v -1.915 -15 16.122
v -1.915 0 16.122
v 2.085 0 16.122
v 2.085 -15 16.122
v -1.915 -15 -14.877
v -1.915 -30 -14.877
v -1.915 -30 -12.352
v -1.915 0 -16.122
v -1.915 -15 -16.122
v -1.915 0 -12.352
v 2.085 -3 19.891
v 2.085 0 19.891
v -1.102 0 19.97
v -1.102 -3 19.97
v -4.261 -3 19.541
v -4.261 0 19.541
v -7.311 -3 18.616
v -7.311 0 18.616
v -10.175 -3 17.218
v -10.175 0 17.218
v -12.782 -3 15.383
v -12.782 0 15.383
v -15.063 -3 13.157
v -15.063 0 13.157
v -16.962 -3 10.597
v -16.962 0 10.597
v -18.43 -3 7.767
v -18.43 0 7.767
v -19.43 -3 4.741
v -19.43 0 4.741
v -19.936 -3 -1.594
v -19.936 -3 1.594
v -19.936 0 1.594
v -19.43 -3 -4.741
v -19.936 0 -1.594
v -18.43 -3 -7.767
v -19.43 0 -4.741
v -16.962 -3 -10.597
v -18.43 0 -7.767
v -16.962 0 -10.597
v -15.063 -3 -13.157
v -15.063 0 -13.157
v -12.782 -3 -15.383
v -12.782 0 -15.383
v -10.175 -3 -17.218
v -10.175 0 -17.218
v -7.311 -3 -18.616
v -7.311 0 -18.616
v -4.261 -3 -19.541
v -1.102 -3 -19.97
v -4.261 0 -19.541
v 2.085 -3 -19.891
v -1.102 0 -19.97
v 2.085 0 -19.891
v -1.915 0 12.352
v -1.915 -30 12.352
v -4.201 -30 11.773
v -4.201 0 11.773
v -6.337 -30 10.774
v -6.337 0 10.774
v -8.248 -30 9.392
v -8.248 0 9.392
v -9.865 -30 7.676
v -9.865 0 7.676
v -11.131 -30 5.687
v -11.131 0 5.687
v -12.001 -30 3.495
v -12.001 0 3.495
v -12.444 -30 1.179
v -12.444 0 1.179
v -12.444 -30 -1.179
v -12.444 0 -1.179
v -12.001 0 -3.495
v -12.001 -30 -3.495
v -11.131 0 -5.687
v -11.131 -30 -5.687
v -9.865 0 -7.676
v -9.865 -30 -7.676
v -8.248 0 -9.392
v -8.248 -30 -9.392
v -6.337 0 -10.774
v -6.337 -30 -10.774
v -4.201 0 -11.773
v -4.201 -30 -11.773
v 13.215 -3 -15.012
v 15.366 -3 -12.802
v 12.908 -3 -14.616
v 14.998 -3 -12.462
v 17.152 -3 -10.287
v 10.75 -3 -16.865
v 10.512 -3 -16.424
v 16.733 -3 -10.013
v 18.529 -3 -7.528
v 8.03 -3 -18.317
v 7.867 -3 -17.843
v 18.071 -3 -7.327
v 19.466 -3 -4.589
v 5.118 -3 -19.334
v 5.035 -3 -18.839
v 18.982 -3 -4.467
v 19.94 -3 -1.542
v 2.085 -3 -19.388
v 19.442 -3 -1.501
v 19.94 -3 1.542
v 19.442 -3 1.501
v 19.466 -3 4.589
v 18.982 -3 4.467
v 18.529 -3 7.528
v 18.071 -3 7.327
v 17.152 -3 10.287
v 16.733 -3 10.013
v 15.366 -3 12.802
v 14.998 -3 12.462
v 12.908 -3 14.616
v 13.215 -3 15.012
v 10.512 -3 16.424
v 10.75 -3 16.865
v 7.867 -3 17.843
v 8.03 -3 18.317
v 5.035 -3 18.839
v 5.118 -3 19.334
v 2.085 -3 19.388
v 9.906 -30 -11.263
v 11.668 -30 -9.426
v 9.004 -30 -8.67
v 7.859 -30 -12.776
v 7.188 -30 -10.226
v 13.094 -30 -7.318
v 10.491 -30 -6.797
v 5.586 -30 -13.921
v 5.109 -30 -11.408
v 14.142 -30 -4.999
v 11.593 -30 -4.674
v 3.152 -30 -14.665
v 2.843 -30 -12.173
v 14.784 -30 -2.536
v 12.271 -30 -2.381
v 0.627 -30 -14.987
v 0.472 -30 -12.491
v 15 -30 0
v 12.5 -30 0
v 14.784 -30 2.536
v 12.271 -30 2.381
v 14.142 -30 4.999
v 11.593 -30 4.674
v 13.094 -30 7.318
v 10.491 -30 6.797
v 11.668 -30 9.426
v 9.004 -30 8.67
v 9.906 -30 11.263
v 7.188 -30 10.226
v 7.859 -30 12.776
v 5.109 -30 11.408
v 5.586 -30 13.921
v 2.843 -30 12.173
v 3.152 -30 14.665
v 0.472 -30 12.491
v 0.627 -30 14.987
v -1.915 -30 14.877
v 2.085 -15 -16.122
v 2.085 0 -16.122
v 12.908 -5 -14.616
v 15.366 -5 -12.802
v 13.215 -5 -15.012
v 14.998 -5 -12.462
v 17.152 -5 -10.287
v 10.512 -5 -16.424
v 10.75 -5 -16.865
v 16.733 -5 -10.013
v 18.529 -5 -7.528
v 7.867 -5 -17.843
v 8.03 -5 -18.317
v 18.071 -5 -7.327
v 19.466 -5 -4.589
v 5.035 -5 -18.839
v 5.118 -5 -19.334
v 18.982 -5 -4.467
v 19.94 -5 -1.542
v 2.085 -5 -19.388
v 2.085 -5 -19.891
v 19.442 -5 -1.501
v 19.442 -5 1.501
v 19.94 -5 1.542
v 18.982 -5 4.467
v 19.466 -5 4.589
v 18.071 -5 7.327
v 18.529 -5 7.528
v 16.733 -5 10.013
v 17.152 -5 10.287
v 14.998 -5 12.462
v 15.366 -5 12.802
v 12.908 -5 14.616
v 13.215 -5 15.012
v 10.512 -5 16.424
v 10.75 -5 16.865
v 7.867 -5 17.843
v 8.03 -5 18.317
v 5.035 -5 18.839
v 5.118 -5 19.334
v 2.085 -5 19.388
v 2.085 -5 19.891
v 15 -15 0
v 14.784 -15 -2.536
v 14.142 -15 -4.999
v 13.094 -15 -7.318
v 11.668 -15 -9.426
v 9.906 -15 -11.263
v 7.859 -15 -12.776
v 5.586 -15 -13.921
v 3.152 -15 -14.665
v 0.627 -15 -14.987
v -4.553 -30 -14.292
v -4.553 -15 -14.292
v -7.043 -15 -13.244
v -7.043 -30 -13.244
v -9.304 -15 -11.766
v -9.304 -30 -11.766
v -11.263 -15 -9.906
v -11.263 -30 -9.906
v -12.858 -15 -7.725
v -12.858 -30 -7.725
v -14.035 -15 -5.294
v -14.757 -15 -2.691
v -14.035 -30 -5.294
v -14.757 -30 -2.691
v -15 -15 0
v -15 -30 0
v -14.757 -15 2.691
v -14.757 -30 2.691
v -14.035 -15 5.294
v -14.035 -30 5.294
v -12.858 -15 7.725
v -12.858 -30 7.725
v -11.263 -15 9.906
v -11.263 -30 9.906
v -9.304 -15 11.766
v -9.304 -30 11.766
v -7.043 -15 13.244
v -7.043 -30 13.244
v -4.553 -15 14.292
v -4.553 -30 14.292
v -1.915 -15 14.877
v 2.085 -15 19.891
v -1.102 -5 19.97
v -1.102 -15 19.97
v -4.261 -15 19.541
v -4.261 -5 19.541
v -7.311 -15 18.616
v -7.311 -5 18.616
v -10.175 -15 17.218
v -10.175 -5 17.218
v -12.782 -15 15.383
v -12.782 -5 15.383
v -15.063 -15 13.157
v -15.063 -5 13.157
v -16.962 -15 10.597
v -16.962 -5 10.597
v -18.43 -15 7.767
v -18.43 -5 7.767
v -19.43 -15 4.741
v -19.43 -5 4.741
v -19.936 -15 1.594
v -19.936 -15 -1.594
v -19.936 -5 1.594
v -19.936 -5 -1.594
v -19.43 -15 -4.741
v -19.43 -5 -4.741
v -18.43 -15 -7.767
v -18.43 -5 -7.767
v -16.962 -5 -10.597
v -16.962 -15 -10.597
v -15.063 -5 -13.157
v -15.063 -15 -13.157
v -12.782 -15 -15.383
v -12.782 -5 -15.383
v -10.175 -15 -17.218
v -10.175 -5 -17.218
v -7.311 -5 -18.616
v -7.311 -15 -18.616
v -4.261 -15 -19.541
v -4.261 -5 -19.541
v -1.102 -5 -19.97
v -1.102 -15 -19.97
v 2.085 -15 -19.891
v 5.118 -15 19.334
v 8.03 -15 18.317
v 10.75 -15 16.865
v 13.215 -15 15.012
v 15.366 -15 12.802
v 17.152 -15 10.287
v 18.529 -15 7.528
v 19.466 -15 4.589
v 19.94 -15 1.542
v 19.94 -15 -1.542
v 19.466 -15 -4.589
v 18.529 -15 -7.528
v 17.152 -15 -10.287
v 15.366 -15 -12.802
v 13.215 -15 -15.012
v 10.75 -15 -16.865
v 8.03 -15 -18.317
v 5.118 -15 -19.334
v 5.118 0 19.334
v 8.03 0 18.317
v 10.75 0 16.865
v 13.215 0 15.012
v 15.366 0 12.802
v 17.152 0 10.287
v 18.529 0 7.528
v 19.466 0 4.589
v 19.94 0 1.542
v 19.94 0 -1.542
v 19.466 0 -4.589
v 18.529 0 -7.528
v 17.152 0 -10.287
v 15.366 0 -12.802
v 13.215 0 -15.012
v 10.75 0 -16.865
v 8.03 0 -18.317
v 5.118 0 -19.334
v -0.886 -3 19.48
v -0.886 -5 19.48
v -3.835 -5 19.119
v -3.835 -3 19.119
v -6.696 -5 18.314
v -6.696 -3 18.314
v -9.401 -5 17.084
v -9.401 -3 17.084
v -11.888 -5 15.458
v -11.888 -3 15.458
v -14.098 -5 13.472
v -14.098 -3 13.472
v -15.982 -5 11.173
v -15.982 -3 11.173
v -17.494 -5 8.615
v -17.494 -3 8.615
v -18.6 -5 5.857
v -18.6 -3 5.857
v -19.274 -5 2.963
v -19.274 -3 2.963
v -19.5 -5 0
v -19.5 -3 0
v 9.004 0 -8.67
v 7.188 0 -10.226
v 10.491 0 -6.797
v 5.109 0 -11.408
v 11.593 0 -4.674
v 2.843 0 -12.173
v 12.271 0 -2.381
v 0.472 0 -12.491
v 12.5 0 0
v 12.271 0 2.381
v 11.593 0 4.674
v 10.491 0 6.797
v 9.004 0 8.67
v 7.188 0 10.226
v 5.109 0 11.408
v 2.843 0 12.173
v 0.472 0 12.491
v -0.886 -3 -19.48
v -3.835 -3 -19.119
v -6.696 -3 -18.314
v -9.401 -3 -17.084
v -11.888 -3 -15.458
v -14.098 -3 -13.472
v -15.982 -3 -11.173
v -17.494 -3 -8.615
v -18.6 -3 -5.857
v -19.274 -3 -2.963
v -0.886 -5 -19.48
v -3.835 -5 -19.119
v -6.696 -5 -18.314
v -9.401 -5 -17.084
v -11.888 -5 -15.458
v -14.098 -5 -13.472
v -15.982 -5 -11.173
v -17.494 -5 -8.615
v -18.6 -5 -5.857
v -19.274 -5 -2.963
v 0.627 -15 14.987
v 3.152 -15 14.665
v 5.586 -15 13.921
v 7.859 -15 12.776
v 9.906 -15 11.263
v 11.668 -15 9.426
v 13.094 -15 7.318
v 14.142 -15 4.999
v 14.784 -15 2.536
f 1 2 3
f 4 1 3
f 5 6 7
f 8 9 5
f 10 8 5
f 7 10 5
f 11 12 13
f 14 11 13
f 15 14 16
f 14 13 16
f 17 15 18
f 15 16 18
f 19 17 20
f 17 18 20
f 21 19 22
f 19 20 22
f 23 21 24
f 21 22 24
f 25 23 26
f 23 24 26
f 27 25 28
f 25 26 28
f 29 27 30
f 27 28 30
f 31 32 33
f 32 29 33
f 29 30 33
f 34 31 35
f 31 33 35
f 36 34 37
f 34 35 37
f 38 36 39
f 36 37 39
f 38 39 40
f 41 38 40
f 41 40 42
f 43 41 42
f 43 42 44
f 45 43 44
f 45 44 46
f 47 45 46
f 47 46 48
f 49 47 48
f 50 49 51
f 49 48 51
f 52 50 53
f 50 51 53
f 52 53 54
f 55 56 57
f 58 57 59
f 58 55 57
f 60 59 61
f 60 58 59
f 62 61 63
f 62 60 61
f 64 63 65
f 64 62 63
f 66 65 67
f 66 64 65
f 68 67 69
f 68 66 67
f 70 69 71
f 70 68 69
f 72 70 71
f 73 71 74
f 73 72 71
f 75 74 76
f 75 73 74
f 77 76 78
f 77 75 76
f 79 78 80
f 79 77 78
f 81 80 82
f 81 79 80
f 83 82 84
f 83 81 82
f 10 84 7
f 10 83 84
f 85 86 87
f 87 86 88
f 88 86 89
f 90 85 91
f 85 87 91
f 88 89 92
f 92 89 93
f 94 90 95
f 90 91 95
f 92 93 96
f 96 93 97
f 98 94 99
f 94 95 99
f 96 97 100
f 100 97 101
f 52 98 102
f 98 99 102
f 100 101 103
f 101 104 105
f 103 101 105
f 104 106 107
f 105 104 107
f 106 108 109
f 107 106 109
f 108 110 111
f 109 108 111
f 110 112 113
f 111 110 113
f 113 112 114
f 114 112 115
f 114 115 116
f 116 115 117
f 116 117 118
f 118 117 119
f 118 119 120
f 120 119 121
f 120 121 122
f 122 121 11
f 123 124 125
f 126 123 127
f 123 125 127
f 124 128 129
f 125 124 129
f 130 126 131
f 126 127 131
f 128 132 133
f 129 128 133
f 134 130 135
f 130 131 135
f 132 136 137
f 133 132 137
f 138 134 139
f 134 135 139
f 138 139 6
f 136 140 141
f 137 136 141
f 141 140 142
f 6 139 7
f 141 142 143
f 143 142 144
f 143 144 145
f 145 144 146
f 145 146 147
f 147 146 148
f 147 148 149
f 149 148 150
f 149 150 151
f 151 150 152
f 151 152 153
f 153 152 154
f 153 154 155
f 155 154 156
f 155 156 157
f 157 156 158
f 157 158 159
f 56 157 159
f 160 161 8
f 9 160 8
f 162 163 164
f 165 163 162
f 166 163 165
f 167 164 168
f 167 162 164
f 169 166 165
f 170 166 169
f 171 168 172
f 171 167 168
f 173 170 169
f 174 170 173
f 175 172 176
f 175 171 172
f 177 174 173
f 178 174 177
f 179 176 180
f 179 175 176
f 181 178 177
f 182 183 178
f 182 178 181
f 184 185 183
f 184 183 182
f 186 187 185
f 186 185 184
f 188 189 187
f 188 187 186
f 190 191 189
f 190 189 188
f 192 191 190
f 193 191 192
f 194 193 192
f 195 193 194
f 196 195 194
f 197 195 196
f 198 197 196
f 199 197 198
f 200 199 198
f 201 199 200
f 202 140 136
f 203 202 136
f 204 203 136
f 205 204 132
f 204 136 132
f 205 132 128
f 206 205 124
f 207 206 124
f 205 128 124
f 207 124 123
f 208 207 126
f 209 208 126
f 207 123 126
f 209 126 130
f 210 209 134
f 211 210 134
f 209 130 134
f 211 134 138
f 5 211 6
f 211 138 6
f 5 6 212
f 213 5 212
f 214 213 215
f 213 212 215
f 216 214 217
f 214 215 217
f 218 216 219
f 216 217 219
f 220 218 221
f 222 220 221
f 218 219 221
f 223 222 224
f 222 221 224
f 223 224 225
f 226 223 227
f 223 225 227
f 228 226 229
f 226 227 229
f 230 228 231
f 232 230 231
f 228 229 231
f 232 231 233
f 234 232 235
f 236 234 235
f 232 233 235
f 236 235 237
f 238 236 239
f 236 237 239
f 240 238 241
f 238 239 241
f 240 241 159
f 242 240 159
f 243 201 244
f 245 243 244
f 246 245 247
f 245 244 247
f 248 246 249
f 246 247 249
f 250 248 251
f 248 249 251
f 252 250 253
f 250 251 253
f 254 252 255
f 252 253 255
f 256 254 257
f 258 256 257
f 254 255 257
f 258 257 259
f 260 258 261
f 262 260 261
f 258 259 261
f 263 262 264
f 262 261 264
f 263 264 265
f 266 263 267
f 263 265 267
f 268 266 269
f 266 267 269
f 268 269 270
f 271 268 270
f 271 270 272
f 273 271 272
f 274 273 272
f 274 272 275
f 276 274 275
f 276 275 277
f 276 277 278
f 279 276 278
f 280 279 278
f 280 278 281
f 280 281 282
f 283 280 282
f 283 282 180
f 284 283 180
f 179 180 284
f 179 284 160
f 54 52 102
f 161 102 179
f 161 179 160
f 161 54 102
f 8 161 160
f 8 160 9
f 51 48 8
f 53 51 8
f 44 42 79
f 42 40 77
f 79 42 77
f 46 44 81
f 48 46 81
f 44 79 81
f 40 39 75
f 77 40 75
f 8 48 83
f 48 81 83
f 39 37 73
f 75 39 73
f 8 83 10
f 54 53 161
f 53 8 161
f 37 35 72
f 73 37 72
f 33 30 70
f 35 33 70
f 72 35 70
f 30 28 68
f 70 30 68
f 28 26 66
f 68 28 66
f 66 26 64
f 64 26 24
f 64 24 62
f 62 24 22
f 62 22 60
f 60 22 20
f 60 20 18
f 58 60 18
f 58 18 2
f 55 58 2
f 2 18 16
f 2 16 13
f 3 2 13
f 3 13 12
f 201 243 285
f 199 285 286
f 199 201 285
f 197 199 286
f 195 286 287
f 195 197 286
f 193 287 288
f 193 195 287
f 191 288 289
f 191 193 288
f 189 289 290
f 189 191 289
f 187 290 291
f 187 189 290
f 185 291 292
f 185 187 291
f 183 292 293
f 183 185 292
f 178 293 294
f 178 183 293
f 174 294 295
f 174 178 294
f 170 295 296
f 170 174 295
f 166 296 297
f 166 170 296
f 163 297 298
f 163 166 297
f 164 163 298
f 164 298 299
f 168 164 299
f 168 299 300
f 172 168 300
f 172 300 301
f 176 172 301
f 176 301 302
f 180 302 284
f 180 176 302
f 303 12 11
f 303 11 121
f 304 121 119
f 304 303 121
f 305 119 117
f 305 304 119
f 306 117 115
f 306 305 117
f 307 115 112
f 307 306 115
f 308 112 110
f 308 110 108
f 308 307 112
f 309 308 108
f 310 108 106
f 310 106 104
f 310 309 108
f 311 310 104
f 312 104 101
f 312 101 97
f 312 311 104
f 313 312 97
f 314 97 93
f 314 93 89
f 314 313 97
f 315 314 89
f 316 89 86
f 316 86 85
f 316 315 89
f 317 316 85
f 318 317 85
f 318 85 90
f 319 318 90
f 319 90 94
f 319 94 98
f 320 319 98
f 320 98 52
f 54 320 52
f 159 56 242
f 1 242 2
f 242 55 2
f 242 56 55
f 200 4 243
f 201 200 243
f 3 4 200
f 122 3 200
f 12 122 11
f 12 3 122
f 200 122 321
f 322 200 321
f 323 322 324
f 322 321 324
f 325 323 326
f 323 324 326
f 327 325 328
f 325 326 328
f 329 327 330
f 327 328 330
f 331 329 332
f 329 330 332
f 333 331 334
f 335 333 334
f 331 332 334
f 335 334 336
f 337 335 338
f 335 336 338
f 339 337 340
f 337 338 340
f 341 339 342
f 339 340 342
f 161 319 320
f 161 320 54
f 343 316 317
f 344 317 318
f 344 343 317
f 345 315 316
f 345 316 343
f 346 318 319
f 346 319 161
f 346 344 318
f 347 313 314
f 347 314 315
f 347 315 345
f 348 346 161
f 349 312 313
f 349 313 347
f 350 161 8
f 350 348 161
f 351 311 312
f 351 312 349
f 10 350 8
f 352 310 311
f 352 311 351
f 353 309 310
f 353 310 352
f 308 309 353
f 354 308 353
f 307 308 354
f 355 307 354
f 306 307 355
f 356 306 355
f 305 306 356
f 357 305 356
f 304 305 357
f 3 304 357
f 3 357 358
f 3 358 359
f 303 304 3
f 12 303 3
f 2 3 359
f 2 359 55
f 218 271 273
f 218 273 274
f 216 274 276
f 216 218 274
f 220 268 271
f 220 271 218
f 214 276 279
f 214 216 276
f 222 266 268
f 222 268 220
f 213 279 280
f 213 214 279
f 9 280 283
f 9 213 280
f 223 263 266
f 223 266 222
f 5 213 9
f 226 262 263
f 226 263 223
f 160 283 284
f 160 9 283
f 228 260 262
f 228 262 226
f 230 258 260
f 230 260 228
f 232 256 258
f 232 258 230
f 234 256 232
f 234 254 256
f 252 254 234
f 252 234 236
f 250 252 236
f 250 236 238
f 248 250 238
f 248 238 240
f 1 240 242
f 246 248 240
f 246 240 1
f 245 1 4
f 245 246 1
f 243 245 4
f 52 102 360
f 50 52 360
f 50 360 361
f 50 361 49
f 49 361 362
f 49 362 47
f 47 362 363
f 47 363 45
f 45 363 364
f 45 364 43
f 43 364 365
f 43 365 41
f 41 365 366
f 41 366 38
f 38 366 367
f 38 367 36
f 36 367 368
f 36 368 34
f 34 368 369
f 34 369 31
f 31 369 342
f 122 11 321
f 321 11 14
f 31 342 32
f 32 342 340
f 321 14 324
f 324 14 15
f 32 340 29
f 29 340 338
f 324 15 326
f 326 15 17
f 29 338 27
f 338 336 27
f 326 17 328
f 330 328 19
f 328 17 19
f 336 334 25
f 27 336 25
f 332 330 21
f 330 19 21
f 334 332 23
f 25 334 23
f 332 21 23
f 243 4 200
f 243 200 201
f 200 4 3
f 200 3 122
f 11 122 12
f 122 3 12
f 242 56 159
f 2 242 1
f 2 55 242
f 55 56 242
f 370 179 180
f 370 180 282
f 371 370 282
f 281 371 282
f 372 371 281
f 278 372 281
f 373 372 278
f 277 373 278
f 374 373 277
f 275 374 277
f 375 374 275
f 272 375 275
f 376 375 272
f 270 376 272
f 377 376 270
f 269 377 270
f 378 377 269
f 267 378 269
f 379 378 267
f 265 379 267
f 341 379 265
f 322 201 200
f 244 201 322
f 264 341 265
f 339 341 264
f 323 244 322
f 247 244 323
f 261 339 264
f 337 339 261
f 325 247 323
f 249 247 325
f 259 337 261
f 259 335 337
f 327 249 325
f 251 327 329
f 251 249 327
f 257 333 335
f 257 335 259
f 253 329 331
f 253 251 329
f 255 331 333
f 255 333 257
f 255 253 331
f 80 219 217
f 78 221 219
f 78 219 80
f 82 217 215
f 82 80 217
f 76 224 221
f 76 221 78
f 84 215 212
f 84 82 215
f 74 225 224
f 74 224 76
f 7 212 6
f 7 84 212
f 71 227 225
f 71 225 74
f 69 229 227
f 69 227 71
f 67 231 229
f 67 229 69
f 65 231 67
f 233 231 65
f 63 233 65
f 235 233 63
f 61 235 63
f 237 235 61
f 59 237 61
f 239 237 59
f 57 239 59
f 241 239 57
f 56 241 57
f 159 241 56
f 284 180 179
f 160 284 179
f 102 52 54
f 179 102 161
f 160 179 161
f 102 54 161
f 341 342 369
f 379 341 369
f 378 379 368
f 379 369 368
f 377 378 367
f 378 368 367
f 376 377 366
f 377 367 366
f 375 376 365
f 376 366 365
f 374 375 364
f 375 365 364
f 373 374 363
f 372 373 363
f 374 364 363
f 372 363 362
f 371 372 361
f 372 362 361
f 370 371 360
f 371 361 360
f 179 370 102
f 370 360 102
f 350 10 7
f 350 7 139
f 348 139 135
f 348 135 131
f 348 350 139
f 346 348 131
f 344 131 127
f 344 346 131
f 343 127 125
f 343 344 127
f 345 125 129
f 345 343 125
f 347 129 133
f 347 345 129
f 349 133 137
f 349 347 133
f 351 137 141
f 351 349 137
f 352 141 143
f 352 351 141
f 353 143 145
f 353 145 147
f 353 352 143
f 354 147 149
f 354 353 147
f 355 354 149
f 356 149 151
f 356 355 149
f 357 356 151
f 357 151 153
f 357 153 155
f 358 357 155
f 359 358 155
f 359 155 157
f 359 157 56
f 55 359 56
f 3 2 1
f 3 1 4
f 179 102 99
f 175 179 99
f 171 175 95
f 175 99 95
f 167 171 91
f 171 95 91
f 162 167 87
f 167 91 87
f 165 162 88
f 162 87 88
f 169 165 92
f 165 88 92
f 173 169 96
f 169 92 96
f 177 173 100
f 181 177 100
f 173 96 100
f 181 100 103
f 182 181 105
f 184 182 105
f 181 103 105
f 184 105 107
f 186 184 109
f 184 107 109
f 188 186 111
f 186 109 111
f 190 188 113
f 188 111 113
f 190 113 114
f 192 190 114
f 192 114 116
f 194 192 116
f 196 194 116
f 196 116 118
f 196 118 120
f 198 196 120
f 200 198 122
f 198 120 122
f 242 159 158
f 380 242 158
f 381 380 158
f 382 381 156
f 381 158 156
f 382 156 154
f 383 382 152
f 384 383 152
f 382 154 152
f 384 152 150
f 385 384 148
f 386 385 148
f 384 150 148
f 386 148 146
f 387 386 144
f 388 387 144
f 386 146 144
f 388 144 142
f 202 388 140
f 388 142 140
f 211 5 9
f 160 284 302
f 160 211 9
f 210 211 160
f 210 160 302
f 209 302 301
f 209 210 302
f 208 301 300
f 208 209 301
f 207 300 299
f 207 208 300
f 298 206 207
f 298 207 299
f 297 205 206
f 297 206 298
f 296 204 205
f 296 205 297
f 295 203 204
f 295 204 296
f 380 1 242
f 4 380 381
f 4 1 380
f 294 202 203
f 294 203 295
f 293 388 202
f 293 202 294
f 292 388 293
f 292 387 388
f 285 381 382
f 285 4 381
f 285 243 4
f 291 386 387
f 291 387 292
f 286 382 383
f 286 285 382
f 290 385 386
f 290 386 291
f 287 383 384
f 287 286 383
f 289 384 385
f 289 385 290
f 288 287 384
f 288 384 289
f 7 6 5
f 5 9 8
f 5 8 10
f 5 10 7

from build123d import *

# Parameters (mm, degrees)
F0_R      = 15
F0_R_2    = 12.5
F1_DEPTH  = 30
F0_R_3    = 20
F2_DEPTH  = 30
F5_DEPTH  = 30.001
F6_DEPTH  = 30
F8_DEPTH  = 15
F10_DEPTH = 15
F12_START = -3
F12_DEPTH = 2
F14_START = -3
F14_DEPTH = 2


with BuildPart() as f1:
    # F0 (on Front) → F1 (new body)
    with BuildSketch(Plane.XZ):
        Circle(F0_R)
        Circle(F0_R_2, mode=Mode.SUBTRACT)
    extrude(amount=F1_DEPTH)

    # F0 (on Front) → F2 (join)
    with BuildSketch(Plane.XZ):
        Circle(F0_R_3)
        Circle(F0_R, mode=Mode.SUBTRACT)
    extrude(amount=F2_DEPTH)

    # F4 (on face) → F5 (cut, through all)
    with BuildSketch(Plane(origin=(0, 0, 0), x_dir=(-1, 0, 0), z_dir=(0, 1, 0))):
        with BuildLine():
            ThreePointArc((-2.0845379567, 19.891070899), (-15.5123164514, 12.6241054459), (-19.8997487421, -2))
            Line((-19.8997487421, -2), (-15.8997487421, -2))
            Line((-15.8997487421, -2), (-15.8997487421, 2))
            Line((-15.8997487421, 2), (-12.3389626793, 2))
            ThreePointArc((-12.3389626793, 2), (-7.3454219936, 10.1140879834), (1.9154620433, 12.3523684029))
            Line((1.9154620433, 12.3523684029), (1.9154620433, 16.1217196509))
            Line((1.9154620433, 16.1217196509), (-2.0845379567, 16.1217196509))
            Line((-2.0845379567, 16.1217196509), (-2.0845379567, 19.891070899))
        make_face()
        with BuildLine():
            Line((-15.8997487421, -2), (-19.8997487421, -2))
            ThreePointArc((-19.8997487421, -2), (-14.172149445, -14.1120579686), (-2.0845379567, -19.891070899))
            Line((-2.0845379567, -19.891070899), (-2.0845379567, -16.1217196509))
            Line((-2.0845379567, -16.1217196509), (1.9154620433, -16.1217196509))
            Line((1.9154620433, -16.1217196509), (1.9154620433, -12.3523684029))
            ThreePointArc((1.9154620433, -12.3523684029), (-8.8333015761, -8.8443644919), (-12.3547561692, 1.9))
            ThreePointArc((-12.3547561692, 1.9), (-12.3469606641, 1.9500159893), (-12.3389626793, 2))
            Line((-12.3389626793, 2), (-15.8997487421, 2))
            Line((-15.8997487421, 2), (-15.8997487421, -2))
        make_face()
    extrude(amount=-F5_DEPTH, mode=Mode.SUBTRACT)

    # F7 (on face) → F8 (cut)
    with BuildSketch(Plane.XZ.offset(30)):
        with BuildLine():
            ThreePointArc((-1.9154620433, -14.8771974901), (-15, 0), (-1.9154620433, 14.8771974901))
            Line((-1.9154620433, 14.8771974901), (-1.9154620433, 16.1217196509))
            Line((-1.9154620433, 16.1217196509), (2.0845379567, 16.1217196509))
            Line((2.0845379567, 16.1217196509), (2.0845379567, 19.891070899))
            ThreePointArc((2.0845379567, 19.891070899), (-20, 0), (2.0845379567, -19.891070899))
            Line((2.0845379567, -19.891070899), (2.0845379567, -16.1217196509))
            Line((2.0845379567, -16.1217196509), (-1.9154620433, -16.1217196509))
            Line((-1.9154620433, -16.1217196509), (-1.9154620433, -14.8771974901))
        make_face()
    extrude(amount=-F8_DEPTH, mode=Mode.SUBTRACT)

    # F13 (on face) → F14 (cut)
    with BuildSketch(Plane(origin=(0, 0, 0), x_dir=(-1, 0, 0), z_dir=(0, 1, 0)).offset(F14_START)):
        with BuildLine():
            ThreePointArc((-2.0845379567, 19.3882619517), (13.0307618704, 14.506868893), (19.5, 0))
            ThreePointArc((19.5, 0), (13.0307618704, -14.506868893), (-2.0845379567, -19.3882619517))
            Line((-2.0845379567, -19.3882619517), (-2.0845379567, -19.891070899))
            ThreePointArc((-2.0845379567, -19.891070899), (20, 0), (-2.0845379567, 19.891070899))
            Line((-2.0845379567, 19.891070899), (-2.0845379567, 19.3882619517))
        make_face()
    extrude(amount=-F14_DEPTH, mode=Mode.SUBTRACT)


with BuildPart() as f6:
    # F3 (on face) → F6 (new body)
    with BuildSketch(Plane(origin=(0, 0, 0), x_dir=(-1, 0, 0), z_dir=(0, 1, 0))):
        with BuildLine():
            Line((-2.0845379567, 16.1217196509), (-2.0845379567, 19.891070899))
            ThreePointArc((-2.0845379567, 19.891070899), (-20, 0), (-2.0845379567, -19.891070899))
            Line((-2.0845379567, -19.891070899), (-2.0845379567, -16.1217196509))
            Line((-2.0845379567, -16.1217196509), (1.9154620433, -16.1217196509))
            Line((1.9154620433, -16.1217196509), (1.9154620433, -12.3523684029))
            ThreePointArc((1.9154620433, -12.3523684029), (-12.5, 0), (1.9154620433, 12.3523684029))
            Line((1.9154620433, 12.3523684029), (1.9154620433, 16.1217196509))
            Line((1.9154620433, 16.1217196509), (-2.0845379567, 16.1217196509))
        make_face()
    extrude(amount=-F6_DEPTH)

    # F9 (on face) → F10 (cut)
    with BuildSketch(Plane.XZ.offset(30)):
        with BuildLine():
            ThreePointArc((-1.9154620433, 14.8771974901), (9.9062623968, 11.2634792726), (15, 0))
            ThreePointArc((15, 0), (9.9062623968, -11.2634792726), (-1.9154620433, -14.8771974901))
            Line((-1.9154620433, -14.8771974901), (-1.9154620433, -16.1217196509))
            Line((-1.9154620433, -16.1217196509), (2.0845379567, -16.1217196509))
            Line((2.0845379567, -16.1217196509), (2.0845379567, -19.891070899))
            ThreePointArc((2.0845379567, -19.891070899), (20, 0), (2.0845379567, 19.891070899))
            Line((2.0845379567, 19.891070899), (2.0845379567, 16.1217196509))
            Line((2.0845379567, 16.1217196509), (-1.9154620433, 16.1217196509))
            Line((-1.9154620433, 16.1217196509), (-1.9154620433, 14.8771974901))
        make_face()
    extrude(amount=-F10_DEPTH, mode=Mode.SUBTRACT)

    # F11 (on face) → F12 (cut)
    with BuildSketch(Plane(origin=(0, 0, 0), x_dir=(-1, 0, 0), z_dir=(0, 1, 0)).offset(F12_START)):
        with BuildLine():
            ThreePointArc((-2.0845379567, -19.3882619517), (-19.5, 0), (-2.0845379567, 19.3882619517))
            Line((-2.0845379567, 19.3882619517), (-2.0845379567, 19.891070899))
            ThreePointArc((-2.0845379567, 19.891070899), (-20, 0), (-2.0845379567, -19.891070899))
            Line((-2.0845379567, -19.891070899), (-2.0845379567, -19.3882619517))
        make_face()
    extrude(amount=-F12_DEPTH, mode=Mode.SUBTRACT)


solid = Compound([f1.part, f6.part])
